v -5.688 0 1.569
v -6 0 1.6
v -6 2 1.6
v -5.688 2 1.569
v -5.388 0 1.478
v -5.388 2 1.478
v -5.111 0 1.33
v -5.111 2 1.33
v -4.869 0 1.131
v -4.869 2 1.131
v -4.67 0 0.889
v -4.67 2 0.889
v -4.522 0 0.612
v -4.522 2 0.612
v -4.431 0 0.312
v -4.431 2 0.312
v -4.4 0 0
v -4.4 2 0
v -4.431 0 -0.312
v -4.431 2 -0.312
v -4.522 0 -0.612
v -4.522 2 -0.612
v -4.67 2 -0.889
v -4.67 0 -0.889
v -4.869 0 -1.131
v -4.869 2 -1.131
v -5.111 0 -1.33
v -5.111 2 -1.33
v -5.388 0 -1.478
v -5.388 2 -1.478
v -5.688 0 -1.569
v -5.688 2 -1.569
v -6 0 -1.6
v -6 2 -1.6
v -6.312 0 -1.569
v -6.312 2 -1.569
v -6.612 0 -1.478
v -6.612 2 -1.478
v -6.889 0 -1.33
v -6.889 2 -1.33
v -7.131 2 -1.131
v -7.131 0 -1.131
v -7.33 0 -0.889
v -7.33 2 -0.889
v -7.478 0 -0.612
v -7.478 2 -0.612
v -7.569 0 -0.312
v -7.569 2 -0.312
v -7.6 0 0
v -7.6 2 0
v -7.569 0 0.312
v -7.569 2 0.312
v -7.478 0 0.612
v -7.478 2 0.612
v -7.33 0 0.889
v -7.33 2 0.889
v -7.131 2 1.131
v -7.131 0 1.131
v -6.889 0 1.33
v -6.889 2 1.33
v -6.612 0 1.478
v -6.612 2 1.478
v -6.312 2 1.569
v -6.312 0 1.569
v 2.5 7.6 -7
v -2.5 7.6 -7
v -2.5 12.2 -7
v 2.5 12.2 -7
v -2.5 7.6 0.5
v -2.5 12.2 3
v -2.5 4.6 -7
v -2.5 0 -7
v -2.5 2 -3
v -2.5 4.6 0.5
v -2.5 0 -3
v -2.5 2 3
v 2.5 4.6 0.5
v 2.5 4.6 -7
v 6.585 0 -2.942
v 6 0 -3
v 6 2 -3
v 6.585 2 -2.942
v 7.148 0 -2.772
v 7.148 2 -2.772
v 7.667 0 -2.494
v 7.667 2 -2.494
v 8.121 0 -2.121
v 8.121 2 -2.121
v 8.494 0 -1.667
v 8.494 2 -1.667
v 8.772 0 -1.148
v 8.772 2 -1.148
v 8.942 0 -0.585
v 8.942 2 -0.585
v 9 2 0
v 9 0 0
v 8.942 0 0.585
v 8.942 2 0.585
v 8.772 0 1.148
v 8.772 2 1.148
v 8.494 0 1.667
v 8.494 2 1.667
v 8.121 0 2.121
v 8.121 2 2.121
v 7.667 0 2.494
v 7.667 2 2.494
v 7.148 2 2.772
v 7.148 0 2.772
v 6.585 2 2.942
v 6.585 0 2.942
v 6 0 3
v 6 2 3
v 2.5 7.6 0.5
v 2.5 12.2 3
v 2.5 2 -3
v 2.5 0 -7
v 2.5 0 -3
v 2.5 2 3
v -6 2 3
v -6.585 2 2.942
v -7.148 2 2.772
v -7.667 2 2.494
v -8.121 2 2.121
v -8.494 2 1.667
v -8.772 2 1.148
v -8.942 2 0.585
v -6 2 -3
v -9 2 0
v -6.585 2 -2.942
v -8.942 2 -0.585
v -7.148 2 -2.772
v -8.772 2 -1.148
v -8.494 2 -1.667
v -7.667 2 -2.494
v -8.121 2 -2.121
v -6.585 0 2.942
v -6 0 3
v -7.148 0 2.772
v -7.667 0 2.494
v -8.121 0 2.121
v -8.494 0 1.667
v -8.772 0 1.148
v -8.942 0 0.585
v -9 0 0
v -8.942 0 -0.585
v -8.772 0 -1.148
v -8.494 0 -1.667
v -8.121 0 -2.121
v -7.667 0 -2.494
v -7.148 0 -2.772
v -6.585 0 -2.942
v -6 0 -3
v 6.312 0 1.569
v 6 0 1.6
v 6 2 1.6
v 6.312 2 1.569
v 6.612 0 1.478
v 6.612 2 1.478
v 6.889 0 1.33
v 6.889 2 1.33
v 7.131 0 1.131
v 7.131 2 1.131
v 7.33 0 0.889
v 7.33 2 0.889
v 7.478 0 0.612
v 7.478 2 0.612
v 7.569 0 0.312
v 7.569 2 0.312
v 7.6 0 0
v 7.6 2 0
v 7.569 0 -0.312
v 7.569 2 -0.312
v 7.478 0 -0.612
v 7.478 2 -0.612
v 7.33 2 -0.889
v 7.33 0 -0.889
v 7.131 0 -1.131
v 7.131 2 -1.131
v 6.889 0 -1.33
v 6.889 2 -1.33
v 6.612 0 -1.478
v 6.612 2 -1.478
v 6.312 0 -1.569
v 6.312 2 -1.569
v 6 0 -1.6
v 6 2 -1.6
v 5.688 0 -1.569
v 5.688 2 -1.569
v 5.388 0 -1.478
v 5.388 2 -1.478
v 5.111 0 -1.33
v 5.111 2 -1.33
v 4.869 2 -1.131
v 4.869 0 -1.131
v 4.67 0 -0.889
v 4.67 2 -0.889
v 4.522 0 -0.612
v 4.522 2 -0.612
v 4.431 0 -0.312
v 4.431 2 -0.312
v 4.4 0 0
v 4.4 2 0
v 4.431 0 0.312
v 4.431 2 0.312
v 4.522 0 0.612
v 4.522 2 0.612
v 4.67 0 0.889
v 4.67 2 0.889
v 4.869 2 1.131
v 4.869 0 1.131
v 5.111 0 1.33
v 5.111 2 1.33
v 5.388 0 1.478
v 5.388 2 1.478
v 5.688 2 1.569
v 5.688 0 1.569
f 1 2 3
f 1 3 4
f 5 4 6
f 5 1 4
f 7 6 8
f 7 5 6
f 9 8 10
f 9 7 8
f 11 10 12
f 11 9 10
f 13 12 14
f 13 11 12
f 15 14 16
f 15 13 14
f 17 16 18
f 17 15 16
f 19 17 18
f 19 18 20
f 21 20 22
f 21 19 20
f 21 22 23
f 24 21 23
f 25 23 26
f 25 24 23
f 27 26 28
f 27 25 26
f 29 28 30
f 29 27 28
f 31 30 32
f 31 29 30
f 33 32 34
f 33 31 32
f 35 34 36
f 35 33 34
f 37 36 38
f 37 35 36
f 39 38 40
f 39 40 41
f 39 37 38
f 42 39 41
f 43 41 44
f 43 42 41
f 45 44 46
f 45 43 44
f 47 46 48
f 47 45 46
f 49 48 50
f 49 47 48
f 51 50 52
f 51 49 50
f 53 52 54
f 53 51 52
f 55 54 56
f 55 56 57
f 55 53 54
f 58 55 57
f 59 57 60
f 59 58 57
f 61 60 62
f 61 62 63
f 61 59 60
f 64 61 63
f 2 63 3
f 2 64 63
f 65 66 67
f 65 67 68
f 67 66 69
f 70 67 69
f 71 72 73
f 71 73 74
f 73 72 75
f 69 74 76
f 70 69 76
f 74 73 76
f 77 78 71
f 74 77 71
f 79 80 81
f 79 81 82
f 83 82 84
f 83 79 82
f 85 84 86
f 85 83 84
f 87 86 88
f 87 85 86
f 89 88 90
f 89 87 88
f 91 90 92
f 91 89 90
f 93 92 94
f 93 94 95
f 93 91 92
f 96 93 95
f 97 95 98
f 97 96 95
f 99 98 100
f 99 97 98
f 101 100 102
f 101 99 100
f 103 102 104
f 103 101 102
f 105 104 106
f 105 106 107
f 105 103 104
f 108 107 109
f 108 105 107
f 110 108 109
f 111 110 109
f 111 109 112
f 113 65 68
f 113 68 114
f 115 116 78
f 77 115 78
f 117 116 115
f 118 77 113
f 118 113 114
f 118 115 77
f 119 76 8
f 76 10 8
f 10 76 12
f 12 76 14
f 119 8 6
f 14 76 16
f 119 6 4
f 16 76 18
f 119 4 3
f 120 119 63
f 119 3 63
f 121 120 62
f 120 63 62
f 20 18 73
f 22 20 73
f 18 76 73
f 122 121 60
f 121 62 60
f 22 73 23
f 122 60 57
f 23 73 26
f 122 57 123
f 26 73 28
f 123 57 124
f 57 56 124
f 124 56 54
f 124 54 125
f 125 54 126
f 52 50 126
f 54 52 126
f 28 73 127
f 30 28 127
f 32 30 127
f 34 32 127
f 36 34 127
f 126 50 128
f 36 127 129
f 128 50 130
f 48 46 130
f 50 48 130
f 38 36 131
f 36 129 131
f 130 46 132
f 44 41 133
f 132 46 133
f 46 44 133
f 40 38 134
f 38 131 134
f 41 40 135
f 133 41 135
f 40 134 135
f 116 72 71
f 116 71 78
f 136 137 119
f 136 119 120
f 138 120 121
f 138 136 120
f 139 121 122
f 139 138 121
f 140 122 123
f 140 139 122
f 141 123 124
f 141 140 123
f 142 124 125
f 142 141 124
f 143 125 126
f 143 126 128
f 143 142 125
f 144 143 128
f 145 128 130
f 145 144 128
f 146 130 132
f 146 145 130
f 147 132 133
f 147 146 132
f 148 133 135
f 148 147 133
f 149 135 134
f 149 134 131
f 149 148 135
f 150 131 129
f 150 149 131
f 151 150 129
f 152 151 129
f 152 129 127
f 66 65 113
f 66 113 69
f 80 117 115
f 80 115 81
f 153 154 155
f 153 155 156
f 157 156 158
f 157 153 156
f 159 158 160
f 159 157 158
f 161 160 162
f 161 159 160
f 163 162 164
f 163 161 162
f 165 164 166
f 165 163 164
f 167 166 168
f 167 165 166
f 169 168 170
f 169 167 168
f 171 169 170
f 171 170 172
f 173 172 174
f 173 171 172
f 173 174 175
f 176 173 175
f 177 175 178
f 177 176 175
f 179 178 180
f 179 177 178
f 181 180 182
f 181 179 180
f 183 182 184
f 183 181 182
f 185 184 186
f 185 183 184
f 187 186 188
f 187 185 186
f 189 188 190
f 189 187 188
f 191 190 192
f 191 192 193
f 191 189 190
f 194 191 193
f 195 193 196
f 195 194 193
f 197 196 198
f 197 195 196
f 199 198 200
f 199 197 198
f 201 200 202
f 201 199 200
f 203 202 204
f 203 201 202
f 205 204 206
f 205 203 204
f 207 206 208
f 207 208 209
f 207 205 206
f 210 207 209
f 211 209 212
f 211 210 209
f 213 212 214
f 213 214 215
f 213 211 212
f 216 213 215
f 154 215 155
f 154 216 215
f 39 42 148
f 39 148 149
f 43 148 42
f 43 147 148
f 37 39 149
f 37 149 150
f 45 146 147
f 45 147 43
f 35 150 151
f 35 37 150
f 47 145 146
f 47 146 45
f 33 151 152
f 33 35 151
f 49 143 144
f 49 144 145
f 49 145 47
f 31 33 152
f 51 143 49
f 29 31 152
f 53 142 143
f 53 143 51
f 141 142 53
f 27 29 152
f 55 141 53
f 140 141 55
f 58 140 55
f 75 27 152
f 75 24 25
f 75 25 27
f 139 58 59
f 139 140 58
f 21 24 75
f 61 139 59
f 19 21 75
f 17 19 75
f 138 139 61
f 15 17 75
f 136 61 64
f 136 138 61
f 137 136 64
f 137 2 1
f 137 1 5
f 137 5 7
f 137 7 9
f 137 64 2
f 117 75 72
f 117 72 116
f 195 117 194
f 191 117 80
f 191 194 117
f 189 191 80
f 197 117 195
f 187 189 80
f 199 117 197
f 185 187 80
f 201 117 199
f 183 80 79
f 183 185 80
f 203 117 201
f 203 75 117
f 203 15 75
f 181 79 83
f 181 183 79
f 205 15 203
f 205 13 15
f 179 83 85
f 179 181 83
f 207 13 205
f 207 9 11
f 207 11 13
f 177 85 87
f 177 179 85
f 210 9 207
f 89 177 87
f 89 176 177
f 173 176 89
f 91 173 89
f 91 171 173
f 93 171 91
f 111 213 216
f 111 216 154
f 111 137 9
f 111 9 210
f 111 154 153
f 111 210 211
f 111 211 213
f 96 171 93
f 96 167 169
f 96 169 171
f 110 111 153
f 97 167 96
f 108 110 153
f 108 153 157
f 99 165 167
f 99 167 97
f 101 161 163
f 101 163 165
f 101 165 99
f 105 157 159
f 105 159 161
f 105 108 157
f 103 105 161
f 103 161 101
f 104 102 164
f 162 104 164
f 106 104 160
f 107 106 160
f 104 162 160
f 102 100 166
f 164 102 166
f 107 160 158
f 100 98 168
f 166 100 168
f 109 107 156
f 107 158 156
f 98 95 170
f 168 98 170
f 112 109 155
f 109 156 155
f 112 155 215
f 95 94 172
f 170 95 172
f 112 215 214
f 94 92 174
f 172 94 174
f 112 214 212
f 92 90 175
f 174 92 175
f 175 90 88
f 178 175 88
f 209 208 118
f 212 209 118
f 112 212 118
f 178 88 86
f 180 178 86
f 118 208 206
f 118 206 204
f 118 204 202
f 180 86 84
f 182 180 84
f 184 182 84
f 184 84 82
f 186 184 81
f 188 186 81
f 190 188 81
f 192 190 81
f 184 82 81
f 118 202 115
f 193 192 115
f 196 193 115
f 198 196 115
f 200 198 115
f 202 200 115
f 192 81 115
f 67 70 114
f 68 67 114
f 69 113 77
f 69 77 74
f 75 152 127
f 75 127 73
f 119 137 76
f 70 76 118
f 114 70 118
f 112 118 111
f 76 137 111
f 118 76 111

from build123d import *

# Parameters (mm, degrees)
SKETCH_1_R            = 1.6
EXTRUDE_330_DEPTH     = 2
SKETCH_2_W            = 5
SKETCH_2_H            = 10
EXTRUDE_541_DEPTH     = 12.2
SKETCH_3_W            = 5
SKETCH_3_H            = 3
CUT_EXTRUDE_754_DEPTH = 7.5


with BuildPart() as part:
    # Эскиз1 → Extrude 330 (new body)
    with BuildSketch(Plane(origin=(0, 0, 0), x_dir=(1, 0, 0), z_dir=(0, 1, 0))):
        with BuildLine():
            Line((-6, 3), (6, 3))
            ThreePointArc((6, 3), (9, 0), (6, -3))
            Line((6, -3), (-6, -3))
            ThreePointArc((-6, -3), (-9, 0), (-6, 3))
        make_face()
        with Locations(Location((-6, 0, 0), (0, 0, 270))):
            Circle(SKETCH_1_R, mode=Mode.SUBTRACT)
        with Locations(Location((6, 0, 0), (0, 0, 270))):
            Circle(SKETCH_1_R, mode=Mode.SUBTRACT)
    extrude(amount=EXTRUDE_330_DEPTH)

    # Эскиз2 → Extrude 541 (add)
    with BuildSketch(Plane.XZ):
        with Locations((0, -2)):
            Rectangle(SKETCH_2_W, SKETCH_2_H)
    extrude(amount=-EXTRUDE_541_DEPTH)

    # Эскиз3 → Cut-Extrude 754 (cut)
    with BuildSketch(Plane(origin=(0, 0, -7), x_dir=(-1, 0, 0), z_dir=(0, 0, -1))):
        with Locations((0, 6.1)):
            Rectangle(SKETCH_3_W, SKETCH_3_H)
    extrude(amount=-CUT_EXTRUDE_754_DEPTH, mode=Mode.SUBTRACT)


solid = part.part
